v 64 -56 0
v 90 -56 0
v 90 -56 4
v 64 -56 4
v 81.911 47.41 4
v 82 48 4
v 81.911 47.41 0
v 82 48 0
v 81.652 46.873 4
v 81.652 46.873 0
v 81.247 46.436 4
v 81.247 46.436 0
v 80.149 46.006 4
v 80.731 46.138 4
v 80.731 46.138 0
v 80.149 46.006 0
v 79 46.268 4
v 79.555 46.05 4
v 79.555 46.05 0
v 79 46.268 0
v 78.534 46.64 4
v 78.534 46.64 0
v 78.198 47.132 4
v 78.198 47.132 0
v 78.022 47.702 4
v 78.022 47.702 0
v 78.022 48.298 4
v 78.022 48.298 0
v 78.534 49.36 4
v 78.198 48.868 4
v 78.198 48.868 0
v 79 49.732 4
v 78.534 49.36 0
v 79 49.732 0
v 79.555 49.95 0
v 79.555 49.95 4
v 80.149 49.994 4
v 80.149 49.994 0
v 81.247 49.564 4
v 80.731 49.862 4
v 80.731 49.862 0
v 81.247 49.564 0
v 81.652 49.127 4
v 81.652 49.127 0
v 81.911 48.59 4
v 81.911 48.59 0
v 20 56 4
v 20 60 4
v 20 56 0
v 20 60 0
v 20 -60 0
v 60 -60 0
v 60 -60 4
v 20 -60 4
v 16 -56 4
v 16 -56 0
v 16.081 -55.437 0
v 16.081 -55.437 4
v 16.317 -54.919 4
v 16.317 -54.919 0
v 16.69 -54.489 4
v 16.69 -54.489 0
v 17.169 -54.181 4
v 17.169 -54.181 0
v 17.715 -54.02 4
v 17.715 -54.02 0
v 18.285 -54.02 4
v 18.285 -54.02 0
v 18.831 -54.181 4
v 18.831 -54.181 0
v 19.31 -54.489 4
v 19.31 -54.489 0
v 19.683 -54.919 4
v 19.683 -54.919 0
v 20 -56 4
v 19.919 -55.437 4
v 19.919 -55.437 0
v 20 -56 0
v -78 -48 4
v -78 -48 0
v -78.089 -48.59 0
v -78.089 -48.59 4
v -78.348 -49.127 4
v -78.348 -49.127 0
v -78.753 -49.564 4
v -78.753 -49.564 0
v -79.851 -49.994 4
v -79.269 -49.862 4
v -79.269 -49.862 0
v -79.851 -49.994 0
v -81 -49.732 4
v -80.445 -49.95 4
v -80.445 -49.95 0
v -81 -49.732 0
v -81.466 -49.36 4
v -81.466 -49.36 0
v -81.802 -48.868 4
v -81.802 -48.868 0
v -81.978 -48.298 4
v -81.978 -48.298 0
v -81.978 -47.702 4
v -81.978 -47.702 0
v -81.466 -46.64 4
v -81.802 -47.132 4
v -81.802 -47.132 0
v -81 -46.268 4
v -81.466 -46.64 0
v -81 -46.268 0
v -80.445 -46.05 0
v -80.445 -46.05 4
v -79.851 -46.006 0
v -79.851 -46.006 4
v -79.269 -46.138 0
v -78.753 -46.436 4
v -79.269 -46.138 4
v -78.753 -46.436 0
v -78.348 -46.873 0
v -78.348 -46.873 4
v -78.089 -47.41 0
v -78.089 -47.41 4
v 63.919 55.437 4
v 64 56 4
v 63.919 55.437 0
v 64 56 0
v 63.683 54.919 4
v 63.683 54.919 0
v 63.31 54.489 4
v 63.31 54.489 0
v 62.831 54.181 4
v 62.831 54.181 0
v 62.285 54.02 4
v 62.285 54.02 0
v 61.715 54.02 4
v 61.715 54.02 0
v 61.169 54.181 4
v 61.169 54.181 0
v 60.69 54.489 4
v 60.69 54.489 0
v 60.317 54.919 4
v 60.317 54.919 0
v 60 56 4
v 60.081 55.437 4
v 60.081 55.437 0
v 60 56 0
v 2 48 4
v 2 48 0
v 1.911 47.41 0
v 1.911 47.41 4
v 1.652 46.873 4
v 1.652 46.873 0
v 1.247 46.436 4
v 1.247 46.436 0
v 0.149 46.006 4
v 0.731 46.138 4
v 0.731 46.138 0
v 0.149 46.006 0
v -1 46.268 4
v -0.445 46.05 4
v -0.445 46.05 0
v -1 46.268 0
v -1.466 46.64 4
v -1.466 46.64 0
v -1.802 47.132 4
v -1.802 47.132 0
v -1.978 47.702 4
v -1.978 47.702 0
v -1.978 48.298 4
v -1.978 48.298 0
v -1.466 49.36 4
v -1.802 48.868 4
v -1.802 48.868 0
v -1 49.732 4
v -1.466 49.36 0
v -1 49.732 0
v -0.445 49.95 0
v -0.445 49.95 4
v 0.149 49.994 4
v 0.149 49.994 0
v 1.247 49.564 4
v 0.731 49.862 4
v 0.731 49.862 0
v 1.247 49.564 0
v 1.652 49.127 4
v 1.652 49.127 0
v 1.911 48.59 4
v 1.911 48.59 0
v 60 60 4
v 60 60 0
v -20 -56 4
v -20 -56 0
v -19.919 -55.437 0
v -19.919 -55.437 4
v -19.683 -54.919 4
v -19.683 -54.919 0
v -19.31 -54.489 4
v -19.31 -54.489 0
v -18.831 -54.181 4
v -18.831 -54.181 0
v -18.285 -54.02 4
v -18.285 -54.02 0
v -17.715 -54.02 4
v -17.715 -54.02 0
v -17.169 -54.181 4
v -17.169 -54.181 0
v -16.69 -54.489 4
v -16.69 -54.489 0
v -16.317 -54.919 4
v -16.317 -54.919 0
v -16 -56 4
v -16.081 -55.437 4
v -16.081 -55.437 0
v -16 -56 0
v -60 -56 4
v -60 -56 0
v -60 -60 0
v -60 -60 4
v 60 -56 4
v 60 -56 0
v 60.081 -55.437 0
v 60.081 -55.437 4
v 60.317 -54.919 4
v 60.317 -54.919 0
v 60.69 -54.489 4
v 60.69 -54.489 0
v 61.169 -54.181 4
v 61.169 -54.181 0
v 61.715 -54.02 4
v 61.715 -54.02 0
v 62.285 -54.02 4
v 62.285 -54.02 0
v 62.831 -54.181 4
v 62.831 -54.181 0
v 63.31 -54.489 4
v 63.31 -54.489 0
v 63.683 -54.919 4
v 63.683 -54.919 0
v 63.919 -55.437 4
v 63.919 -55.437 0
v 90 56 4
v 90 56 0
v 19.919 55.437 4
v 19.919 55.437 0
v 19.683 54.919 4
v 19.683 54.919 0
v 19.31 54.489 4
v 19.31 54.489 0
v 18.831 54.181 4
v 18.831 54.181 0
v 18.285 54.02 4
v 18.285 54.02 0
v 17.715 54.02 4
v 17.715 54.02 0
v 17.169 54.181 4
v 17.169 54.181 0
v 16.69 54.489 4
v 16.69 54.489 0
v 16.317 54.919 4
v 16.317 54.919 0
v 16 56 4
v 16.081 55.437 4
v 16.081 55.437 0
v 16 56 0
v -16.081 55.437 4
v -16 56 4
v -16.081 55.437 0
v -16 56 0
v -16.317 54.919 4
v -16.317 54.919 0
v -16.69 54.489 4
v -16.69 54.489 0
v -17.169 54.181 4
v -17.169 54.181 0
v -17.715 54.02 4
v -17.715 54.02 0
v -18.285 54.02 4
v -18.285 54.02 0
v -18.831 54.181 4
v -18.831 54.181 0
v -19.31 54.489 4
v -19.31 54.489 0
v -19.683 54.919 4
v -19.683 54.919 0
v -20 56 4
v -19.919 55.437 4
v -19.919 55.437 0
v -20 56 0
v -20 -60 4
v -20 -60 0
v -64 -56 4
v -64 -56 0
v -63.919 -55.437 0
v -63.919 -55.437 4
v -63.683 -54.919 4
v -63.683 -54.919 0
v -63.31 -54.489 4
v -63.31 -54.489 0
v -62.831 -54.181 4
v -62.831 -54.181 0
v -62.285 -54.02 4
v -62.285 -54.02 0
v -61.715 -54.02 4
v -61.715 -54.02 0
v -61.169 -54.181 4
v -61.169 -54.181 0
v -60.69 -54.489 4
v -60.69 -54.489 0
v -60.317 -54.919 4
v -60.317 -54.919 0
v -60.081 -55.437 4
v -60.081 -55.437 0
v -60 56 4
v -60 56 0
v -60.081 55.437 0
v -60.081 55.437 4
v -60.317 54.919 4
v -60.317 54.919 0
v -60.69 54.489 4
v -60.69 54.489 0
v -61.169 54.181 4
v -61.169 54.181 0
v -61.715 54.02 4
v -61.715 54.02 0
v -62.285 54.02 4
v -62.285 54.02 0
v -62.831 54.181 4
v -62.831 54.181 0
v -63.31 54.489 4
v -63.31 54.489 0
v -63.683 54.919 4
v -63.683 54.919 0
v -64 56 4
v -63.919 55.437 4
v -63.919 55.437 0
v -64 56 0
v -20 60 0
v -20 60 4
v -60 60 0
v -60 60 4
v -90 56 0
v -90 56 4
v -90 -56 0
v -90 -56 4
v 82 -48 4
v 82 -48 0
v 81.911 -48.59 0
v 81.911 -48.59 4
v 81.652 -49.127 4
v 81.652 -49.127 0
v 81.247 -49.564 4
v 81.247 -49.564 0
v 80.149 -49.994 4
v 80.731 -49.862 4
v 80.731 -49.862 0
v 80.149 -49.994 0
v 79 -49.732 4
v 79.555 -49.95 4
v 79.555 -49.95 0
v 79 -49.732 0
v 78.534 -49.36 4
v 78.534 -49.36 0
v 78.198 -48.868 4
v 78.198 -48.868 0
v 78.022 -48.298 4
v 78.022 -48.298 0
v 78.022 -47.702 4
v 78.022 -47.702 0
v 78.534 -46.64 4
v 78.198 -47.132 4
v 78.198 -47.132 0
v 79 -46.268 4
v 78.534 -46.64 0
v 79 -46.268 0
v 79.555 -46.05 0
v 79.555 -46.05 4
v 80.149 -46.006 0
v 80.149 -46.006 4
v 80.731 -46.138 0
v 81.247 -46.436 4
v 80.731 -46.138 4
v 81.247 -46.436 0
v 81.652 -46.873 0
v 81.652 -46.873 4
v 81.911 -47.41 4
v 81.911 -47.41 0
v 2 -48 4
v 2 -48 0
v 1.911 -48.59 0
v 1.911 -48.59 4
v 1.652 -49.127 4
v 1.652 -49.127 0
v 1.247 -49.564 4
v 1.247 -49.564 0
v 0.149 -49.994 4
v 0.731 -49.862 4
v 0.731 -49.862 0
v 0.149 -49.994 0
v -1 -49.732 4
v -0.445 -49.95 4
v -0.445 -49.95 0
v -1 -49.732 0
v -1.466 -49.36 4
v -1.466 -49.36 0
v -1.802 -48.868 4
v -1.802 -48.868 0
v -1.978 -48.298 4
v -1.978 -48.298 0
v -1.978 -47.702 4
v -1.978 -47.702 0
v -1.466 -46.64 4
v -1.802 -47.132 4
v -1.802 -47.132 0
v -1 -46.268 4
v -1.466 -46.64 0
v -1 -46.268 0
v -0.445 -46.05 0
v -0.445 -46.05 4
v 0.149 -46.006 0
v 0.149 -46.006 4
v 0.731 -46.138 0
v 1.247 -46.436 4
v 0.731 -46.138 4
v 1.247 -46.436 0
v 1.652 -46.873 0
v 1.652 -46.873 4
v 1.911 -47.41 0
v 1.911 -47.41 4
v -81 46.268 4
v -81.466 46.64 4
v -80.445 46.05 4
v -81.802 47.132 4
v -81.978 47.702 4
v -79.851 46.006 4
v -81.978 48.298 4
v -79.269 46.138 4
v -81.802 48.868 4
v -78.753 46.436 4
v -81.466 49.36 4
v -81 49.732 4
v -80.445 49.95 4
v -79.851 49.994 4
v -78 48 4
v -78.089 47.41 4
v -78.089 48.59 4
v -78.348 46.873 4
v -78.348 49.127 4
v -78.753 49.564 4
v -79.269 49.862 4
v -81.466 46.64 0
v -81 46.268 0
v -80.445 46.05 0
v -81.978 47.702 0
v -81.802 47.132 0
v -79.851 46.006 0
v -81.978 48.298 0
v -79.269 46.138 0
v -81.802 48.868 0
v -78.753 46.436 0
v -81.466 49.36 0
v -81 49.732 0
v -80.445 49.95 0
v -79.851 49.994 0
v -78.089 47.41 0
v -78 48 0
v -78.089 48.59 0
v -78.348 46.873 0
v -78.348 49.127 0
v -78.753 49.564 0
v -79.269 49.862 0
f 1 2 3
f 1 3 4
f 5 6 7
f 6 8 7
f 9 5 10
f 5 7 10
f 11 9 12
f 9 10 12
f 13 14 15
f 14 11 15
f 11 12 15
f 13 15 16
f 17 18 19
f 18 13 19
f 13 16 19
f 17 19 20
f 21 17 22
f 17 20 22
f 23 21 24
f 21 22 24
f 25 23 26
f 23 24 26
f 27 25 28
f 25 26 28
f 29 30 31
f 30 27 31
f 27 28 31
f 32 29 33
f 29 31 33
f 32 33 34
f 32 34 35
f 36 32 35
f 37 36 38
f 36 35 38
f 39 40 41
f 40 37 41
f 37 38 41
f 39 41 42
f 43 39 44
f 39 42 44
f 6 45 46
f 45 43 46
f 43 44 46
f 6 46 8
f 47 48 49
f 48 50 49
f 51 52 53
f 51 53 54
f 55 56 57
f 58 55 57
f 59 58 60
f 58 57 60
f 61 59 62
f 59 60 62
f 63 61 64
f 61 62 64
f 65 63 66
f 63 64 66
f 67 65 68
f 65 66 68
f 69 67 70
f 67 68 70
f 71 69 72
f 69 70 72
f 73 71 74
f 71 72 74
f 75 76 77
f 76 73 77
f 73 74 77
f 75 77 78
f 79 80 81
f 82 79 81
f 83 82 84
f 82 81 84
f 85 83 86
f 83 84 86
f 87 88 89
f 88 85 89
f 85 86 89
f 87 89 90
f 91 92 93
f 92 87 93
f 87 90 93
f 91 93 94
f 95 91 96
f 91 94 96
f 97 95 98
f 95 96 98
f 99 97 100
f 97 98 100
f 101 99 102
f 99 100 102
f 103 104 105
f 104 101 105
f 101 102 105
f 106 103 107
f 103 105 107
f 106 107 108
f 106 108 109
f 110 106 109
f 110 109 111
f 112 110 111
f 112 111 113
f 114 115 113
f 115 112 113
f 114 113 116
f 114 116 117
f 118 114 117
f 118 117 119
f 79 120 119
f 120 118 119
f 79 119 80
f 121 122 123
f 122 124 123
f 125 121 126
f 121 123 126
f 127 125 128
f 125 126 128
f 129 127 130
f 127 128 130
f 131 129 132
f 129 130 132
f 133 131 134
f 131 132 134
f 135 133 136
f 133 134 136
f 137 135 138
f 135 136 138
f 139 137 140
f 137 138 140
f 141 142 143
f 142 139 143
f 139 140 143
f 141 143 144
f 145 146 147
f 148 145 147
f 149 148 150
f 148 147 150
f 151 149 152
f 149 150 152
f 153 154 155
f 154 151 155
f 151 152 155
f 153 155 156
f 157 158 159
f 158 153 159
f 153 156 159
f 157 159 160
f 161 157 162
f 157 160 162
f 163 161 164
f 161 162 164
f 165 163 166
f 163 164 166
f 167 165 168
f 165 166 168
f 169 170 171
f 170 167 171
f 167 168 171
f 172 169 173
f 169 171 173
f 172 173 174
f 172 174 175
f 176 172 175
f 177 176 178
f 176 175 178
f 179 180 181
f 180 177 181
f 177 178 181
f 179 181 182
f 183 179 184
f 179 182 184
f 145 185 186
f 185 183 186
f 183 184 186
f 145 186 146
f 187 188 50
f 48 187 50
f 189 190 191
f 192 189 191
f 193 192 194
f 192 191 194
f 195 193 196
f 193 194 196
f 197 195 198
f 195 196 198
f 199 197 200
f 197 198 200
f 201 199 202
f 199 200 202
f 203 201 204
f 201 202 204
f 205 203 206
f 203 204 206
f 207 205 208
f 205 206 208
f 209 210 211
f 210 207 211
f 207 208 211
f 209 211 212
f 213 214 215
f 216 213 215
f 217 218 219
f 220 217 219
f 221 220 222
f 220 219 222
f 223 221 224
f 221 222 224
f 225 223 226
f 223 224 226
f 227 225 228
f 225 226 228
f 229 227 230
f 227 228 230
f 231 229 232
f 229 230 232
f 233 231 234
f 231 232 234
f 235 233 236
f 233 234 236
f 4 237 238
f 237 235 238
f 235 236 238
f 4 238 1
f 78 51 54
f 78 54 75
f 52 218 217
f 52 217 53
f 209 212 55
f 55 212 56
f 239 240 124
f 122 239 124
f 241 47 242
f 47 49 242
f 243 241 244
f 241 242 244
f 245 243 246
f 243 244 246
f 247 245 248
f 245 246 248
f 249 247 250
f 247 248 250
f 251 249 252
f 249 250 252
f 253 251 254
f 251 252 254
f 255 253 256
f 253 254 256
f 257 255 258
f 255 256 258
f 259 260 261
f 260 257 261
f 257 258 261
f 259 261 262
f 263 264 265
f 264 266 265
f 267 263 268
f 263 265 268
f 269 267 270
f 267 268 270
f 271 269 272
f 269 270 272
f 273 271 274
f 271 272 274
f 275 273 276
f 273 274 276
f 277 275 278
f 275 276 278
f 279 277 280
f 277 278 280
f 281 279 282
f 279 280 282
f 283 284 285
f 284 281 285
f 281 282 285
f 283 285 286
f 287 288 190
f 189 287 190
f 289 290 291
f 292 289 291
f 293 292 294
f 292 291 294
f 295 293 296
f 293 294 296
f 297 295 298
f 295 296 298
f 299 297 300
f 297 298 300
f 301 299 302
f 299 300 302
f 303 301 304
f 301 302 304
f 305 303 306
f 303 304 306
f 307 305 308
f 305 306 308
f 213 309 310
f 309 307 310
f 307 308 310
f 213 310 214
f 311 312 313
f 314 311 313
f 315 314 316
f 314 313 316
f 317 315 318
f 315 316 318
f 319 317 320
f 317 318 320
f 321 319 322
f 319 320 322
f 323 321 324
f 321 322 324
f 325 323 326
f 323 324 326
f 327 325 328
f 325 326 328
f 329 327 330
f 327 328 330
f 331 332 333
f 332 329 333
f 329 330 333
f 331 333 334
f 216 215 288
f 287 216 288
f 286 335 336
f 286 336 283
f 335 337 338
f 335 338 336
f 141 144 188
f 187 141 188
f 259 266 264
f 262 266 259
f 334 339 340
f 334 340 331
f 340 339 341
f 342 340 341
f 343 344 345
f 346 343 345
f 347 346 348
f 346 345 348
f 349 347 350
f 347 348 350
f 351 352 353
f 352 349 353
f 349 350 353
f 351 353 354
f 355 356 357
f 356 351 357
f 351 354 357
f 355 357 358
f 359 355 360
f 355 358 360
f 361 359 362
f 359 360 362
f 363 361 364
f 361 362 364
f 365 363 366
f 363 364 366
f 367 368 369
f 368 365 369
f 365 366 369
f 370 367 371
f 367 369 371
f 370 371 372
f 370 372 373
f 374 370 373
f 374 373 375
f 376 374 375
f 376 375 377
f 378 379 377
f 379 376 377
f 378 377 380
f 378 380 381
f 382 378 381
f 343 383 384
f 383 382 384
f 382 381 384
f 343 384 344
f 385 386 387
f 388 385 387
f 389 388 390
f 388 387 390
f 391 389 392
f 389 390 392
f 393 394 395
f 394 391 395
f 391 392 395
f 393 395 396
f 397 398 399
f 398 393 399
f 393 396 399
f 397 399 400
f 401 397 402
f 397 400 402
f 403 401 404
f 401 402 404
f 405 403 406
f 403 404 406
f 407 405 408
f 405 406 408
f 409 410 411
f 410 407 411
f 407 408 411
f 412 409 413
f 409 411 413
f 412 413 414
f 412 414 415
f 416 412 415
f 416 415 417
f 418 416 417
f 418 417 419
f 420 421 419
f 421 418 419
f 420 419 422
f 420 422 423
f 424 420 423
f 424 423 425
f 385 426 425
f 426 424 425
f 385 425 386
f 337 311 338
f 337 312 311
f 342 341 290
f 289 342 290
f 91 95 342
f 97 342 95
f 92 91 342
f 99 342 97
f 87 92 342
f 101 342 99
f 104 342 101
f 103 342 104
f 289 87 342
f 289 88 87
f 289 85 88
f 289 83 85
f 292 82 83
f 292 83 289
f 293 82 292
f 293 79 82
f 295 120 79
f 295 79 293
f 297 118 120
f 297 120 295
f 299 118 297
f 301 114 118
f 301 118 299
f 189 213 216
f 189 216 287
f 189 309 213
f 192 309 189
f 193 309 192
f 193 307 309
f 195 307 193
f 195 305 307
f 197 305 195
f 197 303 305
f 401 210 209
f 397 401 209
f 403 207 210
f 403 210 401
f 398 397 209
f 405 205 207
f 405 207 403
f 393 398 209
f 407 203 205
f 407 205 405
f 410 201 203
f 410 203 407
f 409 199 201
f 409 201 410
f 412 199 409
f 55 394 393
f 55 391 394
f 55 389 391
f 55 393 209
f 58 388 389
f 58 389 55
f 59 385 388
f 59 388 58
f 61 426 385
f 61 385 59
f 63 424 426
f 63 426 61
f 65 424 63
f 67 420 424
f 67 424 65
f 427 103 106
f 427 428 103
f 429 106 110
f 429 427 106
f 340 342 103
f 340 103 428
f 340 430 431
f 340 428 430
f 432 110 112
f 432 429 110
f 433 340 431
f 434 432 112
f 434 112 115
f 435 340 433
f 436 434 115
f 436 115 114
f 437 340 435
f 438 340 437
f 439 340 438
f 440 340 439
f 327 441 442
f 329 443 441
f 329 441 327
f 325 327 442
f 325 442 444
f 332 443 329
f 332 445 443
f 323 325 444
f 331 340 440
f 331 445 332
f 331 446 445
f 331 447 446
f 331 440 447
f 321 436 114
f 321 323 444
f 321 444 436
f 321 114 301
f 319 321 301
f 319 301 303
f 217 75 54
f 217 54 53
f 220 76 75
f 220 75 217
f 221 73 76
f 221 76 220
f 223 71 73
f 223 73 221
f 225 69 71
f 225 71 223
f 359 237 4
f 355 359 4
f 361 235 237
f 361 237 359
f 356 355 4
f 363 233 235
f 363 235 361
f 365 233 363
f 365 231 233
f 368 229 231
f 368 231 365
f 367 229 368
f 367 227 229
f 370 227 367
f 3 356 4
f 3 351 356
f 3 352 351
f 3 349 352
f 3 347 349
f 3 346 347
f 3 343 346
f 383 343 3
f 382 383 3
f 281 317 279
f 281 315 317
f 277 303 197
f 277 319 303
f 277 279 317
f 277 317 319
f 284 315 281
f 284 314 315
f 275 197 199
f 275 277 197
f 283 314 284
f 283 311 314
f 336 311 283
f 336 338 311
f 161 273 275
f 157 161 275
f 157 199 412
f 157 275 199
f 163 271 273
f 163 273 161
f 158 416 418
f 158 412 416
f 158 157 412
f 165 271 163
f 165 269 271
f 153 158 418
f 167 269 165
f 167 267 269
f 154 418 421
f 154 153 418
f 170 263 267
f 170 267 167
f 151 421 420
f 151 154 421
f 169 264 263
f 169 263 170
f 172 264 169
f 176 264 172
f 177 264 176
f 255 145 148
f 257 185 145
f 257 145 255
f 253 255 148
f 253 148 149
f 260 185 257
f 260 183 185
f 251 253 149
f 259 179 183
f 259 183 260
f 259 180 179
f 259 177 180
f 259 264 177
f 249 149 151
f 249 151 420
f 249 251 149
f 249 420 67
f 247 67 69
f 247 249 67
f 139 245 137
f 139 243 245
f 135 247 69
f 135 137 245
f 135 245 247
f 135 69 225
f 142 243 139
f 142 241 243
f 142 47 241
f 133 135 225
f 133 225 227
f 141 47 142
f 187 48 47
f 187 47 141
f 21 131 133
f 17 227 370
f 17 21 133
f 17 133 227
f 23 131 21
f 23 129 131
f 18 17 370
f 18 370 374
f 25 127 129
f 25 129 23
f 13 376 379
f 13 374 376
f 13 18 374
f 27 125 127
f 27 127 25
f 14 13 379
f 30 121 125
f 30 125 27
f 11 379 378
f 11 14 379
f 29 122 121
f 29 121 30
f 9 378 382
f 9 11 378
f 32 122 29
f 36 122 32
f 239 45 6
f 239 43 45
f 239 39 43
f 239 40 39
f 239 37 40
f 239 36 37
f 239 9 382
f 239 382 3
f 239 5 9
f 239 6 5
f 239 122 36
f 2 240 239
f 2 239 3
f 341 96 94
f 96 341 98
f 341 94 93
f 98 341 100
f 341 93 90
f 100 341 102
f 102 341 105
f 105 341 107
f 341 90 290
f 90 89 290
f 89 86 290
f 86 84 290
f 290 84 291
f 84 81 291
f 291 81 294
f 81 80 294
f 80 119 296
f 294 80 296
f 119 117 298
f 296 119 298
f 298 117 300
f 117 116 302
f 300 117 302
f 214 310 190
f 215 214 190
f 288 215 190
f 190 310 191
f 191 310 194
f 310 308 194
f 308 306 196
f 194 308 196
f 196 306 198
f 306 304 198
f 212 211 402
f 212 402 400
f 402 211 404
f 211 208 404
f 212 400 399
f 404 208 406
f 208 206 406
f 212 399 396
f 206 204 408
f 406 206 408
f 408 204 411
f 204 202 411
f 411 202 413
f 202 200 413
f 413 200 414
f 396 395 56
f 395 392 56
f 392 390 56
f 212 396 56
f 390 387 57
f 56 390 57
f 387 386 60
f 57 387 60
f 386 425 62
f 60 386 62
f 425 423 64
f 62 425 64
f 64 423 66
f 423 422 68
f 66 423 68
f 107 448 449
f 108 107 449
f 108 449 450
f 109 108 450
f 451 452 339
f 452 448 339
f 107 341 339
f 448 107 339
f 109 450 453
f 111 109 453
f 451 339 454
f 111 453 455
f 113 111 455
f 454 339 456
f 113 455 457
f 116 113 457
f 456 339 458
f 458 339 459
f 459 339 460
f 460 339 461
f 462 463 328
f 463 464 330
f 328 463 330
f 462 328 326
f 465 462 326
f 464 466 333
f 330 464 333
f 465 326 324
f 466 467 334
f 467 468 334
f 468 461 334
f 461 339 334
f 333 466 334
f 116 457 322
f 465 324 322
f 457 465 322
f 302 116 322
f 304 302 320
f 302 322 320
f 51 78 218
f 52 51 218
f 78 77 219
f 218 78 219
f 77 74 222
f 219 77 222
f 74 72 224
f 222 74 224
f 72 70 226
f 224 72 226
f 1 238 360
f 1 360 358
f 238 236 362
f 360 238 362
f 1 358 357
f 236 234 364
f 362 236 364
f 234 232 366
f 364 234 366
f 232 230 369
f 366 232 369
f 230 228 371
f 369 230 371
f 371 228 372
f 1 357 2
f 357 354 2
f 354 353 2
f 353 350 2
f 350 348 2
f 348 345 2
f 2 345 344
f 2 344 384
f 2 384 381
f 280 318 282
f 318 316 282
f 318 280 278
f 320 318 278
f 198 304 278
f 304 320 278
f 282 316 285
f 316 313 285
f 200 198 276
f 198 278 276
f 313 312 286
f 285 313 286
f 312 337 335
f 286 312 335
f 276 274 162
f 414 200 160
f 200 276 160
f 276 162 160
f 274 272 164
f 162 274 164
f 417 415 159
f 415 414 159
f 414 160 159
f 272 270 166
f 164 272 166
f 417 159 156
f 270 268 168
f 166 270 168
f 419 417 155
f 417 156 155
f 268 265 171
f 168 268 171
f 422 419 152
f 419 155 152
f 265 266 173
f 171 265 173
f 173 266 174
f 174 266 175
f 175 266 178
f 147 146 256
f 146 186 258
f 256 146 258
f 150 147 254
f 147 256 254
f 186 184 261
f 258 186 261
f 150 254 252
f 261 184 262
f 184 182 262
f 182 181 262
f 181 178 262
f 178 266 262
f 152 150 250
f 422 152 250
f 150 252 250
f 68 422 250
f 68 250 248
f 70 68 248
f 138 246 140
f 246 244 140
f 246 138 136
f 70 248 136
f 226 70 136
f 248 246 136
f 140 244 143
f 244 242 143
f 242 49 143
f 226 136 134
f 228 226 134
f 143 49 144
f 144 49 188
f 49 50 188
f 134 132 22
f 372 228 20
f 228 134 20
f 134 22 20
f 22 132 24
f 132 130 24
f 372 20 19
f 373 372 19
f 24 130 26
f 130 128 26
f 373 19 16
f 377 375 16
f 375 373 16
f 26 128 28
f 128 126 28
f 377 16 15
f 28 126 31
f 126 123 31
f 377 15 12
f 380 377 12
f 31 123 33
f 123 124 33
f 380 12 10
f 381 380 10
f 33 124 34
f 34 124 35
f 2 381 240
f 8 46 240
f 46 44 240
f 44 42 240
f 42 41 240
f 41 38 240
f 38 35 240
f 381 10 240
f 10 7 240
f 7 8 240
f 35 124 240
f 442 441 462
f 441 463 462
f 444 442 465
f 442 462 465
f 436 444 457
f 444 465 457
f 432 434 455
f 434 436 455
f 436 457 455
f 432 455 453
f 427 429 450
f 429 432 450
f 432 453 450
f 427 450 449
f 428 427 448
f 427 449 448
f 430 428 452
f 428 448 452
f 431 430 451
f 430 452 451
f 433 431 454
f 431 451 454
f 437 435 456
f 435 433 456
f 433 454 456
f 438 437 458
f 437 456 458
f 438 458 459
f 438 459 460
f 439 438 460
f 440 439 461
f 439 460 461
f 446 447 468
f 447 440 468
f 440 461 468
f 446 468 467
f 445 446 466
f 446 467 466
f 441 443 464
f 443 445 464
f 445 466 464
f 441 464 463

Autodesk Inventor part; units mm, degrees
ref_plane "YZ Plane" through (0, 0, 0) normal (1, 0, 0) x (0, 1, 0)
ref_plane "XZ Plane" through (0, 0, 0) normal (0, 1, 0) x (-1, 0, 0)
ref_plane "XY Plane" through (0, 0, 0) normal (0, 0, 1) x (1, 0, 0)
sketch "Boceto1" plane through (0, 0, 0) normal (0, 0, 1) x (1, 0, 0)
  line L0 (90, 56) -> (90, -56)
  line L1 (90, -56) -> (64, -56)
  arc A0 (64, -56) -> (60, -56) centre (62, -56) ccw
  line L2 (60, -56) -> (60, -60)
  line L3 (60, -60) -> (20, -60)
  line L4 (20, -60) -> (20, -56)
  arc A1 (20, -56) -> (16, -56) centre (18, -56) ccw
  line L5 (15.6321, 0) -> (-15.6321, 0) construction
  line L6 (0, 12.7826) -> (0, -12.7826) construction
  line L7 (90, 56) -> (64, 56)
  arc A2 (60, 56) -> (64, 56) centre (62, 56) ccw
  line L8 (60, 56) -> (60, 60)
  line L9 (60, 60) -> (20, 60)
  line L10 (20, 60) -> (20, 56)
  arc A3 (16, 56) -> (20, 56) centre (18, 56) ccw
  line L11 (-90, 56) -> (-90, -56)
  line L12 (-90, -56) -> (-64, -56)
  arc A4 (-60, -56) -> (-64, -56) centre (-62, -56) ccw
  line L13 (-60, -56) -> (-60, -60)
  line L14 (-60, -60) -> (-20, -60)
  line L15 (-20, -60) -> (-20, -56)
  arc A5 (-16, -56) -> (-20, -56) centre (-18, -56) ccw
  line L16 (-90, 56) -> (-64, 56)
  arc A6 (-64, 56) -> (-60, 56) centre (-62, 56) ccw
  line L17 (-60, 56) -> (-60, 60)
  line L18 (-60, 60) -> (-20, 60)
  line L19 (-20, 60) -> (-20, 56)
  arc A7 (-20, 56) -> (-16, 56) centre (-18, 56) ccw
  line L20 (-16, 56) -> (16, 56)
  line L21 (-16, -56) -> (16, -56)
  circle A8 centre (0, -48) radius 2
  circle A9 centre (0, 48) radius 2
  circle A10 centre (80, 48) radius 2
  circle A11 centre (80, -48) radius 2
  circle A12 centre (-80, 48) radius 2
  circle A13 centre (-80, -48) radius 2
  point P0 (0, 0)
  point P1 (0, 0)
  dimension "d0" = 2
  dimension "d1" = 120
  dimension "d2" = 40
  dimension "d3" = 4
  dimension "d4" = 40
  dimension "d5" = 30
  dimension "d6" = 8
  dimension "d7" = 4
  dimension "d8" = 20
extrude "Extrusión1" add sketch "Boceto1" along normal blind 4
equation "\"d4\" = d2"
properties part number "bandeja central"
